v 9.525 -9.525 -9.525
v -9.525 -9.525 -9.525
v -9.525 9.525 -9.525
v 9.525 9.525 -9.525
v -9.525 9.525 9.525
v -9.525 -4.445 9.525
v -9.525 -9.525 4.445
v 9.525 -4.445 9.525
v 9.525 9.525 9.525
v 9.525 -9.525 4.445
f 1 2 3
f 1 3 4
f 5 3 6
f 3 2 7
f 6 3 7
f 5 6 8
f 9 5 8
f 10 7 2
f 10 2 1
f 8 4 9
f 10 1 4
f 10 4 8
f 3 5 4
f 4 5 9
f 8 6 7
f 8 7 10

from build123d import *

# Parameters (mm, degrees)
F0_W     = 19.05
F0_H     = 19.05
F1_DEPTH = 9.525
F2_SIZE  = 5.08


with BuildPart() as f1:
    # F0 (on Front) → F1 (new body, symmetric)
    with BuildSketch(Plane.XZ):
        Rectangle(F0_W, F0_H)
    extrude(amount=F1_DEPTH, both=True)

    # F2
    f2_edges = [f1.edges().sort_by_distance(p)[0] for p in [
        (0, -9.525, 9.525),
    ]]
    chamfer(f2_edges, length=F2_SIZE)


solid = f1.part
